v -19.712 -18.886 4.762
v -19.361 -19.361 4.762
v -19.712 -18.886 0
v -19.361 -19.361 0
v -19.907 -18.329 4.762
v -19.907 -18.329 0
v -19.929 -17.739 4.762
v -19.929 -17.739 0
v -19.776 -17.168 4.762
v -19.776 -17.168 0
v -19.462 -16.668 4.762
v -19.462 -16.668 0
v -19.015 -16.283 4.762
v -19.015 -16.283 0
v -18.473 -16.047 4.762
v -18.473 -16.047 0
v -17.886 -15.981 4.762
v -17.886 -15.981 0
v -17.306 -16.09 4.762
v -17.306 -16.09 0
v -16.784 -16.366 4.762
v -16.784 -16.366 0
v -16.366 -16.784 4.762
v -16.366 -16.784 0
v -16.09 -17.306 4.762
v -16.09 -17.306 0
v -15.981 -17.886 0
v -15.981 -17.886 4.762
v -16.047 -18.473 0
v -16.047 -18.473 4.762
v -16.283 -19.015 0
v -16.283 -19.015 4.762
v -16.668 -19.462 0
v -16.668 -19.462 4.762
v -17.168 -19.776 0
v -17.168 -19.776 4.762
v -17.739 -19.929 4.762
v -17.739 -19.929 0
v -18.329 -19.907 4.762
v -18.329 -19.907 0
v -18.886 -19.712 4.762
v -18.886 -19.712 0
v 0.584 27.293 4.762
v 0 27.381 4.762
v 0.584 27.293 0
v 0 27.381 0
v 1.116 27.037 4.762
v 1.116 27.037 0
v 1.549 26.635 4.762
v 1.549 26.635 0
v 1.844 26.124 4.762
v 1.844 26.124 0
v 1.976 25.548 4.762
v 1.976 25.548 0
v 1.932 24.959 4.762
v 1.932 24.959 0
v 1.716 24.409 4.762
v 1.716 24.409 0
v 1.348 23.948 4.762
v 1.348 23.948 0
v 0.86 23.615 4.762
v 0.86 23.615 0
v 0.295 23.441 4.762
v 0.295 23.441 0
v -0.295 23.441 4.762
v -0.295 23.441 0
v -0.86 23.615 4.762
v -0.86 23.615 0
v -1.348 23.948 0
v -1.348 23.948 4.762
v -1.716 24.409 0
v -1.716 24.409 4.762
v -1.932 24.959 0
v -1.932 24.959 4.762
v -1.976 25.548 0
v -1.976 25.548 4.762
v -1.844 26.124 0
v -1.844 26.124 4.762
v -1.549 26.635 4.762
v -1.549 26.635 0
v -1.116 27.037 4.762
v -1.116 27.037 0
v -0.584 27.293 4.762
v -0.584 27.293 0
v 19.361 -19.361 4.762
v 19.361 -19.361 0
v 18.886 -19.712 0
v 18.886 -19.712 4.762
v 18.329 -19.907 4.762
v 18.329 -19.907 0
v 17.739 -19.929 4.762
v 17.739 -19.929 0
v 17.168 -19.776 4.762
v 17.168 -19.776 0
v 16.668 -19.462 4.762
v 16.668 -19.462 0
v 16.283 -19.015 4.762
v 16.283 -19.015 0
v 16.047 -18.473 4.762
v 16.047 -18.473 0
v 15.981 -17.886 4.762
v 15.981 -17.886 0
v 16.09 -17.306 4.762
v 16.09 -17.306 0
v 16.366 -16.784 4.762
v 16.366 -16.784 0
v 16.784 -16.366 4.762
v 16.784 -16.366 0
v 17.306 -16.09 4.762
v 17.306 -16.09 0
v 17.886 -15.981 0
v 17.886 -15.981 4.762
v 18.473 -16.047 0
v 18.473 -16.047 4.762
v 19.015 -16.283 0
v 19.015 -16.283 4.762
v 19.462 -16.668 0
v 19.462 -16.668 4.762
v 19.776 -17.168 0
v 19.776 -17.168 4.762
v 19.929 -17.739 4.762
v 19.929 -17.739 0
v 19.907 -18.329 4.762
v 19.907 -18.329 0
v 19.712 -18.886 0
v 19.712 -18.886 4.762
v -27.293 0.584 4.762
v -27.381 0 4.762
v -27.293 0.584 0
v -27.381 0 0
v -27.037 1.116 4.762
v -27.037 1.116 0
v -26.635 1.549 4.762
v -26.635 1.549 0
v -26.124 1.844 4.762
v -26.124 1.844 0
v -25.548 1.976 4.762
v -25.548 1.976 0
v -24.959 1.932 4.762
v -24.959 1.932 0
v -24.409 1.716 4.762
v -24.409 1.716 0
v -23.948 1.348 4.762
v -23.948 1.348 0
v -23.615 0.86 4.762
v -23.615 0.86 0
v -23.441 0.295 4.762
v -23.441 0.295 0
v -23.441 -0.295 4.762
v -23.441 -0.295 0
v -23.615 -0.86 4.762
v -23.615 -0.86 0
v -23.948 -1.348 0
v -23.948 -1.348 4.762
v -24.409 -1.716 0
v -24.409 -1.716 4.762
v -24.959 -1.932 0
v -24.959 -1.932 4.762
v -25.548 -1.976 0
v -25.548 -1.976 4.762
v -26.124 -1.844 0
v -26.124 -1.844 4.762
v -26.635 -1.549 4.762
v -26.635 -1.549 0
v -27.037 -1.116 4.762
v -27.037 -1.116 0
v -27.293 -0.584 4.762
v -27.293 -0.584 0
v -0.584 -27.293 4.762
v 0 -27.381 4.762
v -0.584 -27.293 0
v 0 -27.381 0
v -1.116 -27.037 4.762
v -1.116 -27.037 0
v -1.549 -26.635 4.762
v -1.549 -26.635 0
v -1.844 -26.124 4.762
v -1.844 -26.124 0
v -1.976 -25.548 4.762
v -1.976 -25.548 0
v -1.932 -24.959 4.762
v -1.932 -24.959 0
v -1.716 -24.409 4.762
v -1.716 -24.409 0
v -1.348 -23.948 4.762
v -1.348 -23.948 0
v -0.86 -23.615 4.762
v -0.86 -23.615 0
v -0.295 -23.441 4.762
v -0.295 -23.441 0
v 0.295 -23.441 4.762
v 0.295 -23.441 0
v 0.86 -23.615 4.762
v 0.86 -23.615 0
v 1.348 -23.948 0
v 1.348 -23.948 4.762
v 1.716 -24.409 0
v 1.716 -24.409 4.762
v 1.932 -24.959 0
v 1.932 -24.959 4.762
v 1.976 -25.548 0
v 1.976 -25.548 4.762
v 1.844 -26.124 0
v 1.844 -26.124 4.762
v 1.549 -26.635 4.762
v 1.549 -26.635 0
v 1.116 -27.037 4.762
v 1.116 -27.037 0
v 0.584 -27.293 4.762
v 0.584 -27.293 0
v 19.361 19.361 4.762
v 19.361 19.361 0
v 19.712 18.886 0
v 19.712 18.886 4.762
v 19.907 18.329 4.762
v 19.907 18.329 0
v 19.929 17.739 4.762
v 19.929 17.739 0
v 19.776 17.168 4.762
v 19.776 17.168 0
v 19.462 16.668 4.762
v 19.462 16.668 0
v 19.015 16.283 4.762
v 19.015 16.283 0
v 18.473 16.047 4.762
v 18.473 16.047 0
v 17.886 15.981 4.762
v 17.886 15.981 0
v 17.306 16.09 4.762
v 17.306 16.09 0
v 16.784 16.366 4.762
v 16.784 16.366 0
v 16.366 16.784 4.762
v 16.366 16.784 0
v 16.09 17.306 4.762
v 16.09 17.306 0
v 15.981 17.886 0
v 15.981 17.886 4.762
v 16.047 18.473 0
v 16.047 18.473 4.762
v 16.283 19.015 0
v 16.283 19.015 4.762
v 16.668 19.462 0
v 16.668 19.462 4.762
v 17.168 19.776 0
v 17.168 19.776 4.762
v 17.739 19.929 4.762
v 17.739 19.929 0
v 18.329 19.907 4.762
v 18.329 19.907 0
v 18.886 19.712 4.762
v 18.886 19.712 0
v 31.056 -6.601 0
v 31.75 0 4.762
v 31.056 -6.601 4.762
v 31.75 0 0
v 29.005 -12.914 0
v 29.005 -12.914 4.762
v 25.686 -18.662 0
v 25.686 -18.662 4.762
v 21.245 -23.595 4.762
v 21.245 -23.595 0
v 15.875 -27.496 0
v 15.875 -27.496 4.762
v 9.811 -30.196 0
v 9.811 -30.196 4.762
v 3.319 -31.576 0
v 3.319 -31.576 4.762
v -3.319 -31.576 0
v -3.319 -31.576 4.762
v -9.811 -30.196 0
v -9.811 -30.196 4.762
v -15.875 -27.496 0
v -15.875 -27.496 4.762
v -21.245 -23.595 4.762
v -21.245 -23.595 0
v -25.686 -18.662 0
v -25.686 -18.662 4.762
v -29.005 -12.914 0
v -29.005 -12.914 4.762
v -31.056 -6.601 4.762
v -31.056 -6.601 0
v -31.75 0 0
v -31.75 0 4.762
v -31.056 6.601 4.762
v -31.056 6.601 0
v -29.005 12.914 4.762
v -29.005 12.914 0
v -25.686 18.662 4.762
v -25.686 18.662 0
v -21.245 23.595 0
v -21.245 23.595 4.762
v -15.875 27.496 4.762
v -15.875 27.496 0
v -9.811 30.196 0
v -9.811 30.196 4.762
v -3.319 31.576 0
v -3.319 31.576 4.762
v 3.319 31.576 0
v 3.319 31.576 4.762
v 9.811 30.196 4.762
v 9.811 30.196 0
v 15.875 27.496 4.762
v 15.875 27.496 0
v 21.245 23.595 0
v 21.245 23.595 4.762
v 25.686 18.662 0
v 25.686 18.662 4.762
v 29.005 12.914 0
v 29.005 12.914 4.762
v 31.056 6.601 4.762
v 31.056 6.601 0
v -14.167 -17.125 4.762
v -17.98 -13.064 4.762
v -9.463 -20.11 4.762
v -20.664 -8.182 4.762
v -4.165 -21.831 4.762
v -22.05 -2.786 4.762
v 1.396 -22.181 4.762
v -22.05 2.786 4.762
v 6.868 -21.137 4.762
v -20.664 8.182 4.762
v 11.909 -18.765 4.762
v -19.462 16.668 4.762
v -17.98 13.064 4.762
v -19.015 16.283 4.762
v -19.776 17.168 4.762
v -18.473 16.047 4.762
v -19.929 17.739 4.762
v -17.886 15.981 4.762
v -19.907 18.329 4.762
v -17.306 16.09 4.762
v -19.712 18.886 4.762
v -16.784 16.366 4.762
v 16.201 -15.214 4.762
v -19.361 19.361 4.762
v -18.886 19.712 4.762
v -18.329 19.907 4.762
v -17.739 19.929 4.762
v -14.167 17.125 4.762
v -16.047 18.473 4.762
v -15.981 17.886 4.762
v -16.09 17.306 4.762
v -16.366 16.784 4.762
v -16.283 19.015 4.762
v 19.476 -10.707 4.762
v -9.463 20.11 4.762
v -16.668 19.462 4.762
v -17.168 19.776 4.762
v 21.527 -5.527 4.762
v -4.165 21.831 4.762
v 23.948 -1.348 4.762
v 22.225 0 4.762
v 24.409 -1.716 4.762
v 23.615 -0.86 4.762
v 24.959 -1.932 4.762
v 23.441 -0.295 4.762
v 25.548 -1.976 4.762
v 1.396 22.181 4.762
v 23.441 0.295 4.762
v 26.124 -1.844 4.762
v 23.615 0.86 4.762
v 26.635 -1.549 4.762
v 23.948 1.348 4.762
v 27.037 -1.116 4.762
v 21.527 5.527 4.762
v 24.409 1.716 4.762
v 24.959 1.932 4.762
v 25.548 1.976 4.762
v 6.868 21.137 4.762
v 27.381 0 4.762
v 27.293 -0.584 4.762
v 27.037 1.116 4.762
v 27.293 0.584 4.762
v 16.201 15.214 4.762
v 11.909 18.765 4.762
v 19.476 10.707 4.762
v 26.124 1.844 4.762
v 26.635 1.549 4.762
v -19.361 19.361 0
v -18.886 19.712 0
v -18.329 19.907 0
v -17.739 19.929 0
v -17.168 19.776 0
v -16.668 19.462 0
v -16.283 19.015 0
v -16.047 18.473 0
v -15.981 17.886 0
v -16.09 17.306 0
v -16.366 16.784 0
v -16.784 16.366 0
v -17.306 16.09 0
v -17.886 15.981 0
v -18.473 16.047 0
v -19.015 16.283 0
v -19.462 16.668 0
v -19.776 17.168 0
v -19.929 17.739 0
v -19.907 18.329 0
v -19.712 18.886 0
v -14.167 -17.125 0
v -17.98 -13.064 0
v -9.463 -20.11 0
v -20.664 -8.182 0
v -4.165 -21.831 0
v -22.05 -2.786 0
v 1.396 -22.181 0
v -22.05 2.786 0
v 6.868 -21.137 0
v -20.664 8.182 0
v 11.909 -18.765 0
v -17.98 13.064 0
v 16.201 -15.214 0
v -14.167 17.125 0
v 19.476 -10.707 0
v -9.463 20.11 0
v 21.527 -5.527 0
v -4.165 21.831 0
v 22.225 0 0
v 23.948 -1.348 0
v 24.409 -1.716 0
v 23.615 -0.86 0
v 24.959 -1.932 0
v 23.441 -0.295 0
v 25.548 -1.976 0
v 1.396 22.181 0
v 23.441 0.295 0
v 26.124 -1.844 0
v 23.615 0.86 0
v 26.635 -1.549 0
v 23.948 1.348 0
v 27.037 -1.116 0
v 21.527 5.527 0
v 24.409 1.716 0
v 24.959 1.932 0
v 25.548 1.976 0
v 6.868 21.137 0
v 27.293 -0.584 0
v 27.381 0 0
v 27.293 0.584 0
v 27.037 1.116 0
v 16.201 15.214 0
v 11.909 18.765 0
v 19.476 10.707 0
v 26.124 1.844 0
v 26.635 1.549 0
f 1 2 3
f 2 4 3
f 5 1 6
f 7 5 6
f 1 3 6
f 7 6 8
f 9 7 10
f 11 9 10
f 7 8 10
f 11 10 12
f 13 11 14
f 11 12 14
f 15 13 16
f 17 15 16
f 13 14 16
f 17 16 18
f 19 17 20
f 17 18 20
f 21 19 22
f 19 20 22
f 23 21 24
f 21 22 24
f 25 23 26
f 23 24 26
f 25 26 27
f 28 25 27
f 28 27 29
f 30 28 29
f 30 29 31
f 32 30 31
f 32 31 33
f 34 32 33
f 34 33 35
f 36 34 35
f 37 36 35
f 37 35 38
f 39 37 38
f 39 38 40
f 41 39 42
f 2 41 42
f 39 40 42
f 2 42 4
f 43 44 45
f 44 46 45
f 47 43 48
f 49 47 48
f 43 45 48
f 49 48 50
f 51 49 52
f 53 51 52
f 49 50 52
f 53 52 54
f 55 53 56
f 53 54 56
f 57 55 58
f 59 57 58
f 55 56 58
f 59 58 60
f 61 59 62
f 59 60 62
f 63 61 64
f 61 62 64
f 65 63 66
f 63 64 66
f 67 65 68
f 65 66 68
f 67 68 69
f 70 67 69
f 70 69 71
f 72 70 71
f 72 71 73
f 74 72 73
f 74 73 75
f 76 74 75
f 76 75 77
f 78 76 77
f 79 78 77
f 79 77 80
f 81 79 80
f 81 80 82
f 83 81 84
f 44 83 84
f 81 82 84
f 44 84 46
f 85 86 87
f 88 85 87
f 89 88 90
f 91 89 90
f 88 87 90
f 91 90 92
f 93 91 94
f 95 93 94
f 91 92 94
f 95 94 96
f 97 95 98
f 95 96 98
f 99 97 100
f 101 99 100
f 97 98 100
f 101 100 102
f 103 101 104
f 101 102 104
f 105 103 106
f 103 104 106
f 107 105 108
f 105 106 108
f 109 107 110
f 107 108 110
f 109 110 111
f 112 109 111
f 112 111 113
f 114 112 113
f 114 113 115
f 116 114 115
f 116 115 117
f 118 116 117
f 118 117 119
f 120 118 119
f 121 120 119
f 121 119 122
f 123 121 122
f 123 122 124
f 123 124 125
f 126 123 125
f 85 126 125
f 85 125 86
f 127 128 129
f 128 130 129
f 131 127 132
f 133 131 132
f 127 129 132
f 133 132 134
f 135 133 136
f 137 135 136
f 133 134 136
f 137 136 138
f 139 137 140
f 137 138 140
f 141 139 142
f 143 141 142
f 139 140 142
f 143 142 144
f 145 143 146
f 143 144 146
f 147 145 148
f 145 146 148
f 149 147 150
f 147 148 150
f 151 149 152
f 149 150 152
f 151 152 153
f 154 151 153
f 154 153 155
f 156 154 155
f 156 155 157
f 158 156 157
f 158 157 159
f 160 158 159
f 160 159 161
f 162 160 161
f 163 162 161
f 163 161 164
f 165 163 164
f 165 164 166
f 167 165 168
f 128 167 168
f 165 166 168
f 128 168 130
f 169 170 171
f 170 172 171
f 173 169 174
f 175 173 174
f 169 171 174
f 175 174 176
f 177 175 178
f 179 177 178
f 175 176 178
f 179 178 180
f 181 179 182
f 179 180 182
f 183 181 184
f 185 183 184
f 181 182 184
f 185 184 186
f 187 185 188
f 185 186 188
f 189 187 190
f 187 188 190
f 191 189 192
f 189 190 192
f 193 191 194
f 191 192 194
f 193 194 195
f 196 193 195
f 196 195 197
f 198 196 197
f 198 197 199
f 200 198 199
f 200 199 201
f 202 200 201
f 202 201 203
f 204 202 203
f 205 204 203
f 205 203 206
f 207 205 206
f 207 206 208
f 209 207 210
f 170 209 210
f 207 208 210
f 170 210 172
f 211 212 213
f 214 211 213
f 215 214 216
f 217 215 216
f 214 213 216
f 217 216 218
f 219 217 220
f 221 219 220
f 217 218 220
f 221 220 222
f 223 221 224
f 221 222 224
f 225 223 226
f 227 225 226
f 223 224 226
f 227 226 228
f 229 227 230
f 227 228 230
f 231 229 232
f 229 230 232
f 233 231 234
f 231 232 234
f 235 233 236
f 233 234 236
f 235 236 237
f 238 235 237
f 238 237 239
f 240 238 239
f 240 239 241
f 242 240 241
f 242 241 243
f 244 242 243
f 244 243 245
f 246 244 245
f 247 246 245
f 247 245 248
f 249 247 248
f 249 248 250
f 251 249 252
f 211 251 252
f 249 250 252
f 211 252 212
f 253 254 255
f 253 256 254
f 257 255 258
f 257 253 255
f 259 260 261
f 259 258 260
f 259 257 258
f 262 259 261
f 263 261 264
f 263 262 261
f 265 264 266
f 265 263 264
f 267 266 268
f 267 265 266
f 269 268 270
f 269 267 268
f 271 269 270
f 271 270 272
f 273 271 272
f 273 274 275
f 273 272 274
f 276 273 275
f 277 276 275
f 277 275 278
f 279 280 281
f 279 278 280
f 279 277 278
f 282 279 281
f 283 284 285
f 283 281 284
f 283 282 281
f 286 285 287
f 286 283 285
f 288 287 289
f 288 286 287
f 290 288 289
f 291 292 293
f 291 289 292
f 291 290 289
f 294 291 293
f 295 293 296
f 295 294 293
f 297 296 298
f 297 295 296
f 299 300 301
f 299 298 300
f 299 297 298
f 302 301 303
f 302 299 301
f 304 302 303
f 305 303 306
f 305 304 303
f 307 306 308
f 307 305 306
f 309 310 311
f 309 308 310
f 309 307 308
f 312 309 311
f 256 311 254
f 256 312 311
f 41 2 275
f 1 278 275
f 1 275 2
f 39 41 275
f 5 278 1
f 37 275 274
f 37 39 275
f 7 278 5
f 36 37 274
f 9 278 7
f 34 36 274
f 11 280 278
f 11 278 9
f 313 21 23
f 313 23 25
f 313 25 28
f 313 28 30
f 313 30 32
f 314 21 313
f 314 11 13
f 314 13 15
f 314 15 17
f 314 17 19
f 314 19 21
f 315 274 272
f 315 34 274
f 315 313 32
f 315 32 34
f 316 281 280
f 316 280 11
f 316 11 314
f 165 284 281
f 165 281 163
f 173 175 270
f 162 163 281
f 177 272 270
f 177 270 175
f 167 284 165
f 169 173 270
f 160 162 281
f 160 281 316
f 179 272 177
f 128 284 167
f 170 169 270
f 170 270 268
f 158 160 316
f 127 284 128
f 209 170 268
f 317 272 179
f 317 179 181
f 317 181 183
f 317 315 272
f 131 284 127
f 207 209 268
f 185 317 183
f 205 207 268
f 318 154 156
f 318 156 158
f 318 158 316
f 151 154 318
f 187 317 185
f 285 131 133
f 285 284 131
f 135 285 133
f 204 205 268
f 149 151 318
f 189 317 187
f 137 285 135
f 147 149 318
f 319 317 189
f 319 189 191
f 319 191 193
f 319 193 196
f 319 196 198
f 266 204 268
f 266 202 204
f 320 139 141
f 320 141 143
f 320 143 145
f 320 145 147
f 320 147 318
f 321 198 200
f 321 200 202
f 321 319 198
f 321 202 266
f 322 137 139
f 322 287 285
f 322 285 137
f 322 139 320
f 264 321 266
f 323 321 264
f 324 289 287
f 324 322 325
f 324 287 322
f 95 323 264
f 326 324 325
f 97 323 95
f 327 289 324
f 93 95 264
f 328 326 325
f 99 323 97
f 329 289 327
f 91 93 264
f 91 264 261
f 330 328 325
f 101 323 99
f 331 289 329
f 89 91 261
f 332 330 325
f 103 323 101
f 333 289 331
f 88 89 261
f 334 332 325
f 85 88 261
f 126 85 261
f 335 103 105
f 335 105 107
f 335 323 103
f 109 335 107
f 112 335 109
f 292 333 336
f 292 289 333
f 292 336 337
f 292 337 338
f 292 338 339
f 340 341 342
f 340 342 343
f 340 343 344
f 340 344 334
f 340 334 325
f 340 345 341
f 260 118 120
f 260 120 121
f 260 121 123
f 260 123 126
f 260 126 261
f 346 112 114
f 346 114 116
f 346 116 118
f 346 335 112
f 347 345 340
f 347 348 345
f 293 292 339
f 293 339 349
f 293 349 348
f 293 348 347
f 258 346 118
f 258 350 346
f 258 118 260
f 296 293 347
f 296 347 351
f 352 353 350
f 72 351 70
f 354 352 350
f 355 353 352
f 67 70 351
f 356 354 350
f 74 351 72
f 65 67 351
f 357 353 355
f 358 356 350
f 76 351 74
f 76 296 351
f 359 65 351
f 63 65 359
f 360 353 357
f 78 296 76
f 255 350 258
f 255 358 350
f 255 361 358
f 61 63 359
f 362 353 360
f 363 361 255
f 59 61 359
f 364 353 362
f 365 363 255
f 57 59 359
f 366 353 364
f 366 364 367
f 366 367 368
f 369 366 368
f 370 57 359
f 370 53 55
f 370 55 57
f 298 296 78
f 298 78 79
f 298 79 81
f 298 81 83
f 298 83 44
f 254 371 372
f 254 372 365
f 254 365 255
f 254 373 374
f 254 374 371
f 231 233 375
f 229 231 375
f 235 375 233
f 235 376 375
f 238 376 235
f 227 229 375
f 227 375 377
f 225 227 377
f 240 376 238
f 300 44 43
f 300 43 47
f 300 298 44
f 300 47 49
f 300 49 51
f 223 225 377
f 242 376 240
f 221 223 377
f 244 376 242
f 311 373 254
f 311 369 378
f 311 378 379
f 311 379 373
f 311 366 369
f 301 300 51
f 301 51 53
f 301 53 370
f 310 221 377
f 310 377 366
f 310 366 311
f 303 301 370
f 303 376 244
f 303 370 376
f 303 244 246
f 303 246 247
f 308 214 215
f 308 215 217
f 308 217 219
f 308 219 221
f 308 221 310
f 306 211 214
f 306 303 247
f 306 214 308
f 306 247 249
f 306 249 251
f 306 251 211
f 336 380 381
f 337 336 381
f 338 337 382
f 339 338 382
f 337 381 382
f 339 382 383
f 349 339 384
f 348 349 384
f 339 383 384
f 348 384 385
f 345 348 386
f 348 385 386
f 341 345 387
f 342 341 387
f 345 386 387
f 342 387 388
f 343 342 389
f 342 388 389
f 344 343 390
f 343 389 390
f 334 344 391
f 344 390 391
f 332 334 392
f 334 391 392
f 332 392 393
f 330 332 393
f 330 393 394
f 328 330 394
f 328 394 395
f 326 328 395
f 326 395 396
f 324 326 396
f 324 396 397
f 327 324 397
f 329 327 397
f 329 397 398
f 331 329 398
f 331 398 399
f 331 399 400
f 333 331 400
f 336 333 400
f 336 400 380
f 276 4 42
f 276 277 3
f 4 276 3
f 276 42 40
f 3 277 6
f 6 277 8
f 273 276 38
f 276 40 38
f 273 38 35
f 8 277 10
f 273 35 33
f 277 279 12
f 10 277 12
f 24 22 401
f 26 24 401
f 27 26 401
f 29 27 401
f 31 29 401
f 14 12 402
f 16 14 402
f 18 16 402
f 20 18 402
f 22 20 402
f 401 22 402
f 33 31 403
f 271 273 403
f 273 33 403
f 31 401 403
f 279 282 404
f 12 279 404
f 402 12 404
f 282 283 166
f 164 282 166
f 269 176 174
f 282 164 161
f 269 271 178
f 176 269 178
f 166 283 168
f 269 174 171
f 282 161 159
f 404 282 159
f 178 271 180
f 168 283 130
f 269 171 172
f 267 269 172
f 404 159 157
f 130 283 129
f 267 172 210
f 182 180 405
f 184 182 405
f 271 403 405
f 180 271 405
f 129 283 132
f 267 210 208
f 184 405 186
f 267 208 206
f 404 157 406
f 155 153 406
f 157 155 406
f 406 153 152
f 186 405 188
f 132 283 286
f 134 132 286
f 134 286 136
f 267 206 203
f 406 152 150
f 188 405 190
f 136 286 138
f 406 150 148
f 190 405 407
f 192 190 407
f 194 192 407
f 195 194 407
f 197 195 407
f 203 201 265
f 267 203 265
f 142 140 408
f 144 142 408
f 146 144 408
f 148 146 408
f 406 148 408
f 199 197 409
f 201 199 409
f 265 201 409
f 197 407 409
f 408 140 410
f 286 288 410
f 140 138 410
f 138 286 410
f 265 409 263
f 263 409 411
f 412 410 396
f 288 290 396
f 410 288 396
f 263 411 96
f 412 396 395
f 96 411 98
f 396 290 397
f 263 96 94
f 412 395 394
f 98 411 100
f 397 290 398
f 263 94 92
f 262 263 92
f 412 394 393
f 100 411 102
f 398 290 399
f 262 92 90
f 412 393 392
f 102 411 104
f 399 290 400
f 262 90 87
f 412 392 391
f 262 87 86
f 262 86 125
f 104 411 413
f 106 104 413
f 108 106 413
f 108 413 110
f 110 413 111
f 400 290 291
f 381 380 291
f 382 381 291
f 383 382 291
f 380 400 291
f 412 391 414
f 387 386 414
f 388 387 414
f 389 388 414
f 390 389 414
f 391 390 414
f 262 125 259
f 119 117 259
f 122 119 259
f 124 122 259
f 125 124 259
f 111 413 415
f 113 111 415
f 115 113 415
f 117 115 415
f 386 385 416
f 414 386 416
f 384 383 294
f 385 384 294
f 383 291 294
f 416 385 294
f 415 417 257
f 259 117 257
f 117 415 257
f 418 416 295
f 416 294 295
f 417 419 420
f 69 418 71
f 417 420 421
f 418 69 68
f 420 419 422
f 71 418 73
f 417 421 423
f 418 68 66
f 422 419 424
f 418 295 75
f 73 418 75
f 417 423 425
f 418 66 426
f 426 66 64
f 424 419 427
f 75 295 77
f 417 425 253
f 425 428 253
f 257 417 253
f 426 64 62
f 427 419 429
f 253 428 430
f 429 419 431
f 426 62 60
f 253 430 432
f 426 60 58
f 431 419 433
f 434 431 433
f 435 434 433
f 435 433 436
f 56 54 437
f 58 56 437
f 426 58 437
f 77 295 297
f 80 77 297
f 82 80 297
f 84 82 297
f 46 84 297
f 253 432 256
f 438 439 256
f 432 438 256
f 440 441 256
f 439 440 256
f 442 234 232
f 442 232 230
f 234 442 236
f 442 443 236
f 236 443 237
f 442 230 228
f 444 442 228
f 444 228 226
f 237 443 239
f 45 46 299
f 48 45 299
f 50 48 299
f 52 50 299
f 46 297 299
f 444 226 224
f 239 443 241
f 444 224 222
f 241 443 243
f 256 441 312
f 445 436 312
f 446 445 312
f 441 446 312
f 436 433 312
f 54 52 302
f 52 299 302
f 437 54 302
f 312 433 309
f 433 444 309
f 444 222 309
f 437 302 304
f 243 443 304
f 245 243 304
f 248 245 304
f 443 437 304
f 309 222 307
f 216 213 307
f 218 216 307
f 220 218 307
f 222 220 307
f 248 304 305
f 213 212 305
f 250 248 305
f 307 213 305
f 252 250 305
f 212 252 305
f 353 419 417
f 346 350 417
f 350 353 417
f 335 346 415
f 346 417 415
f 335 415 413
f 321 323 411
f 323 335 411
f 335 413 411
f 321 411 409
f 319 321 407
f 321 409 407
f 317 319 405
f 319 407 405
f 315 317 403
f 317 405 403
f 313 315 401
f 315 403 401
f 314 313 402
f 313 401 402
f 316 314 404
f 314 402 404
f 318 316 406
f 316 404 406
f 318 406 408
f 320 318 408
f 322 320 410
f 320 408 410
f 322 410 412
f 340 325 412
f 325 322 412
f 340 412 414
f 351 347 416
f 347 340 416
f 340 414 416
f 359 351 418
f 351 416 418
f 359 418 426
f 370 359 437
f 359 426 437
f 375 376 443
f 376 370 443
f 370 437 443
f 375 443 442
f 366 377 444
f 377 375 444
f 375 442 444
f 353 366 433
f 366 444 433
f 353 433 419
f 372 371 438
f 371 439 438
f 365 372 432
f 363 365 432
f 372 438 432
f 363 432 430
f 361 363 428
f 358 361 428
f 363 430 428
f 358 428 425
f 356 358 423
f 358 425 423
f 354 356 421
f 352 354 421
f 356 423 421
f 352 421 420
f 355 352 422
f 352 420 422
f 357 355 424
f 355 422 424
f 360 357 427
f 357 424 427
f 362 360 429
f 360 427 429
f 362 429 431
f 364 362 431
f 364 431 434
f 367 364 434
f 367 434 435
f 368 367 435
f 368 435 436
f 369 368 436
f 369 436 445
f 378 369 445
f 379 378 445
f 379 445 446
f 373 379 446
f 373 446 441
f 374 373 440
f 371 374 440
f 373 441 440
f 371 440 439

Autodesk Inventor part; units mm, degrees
ref_plane "YZ Plane" through (0, 0, 0) normal (1, 0, 0) x (0, 1, 0)
ref_plane "XZ Plane" through (0, 0, 0) normal (0, 1, 0) x (-1, 0, 0)
ref_plane "XY Plane" through (0, 0, 0) normal (0, 0, 1) x (1, 0, 0)
sketch "Sketch2" plane through (0, 0, 0) normal (0, 0, 1) x (1, 0, 0)
  circle A0 centre (0, 0) radius 22.225
  circle A1 centre (0, 0) radius 31.75
  dimension "d0" = 44.45
  dimension "d1" = 9.525
extrude "Extrusion1" add sketch "Sketch2" along normal blind 4.7625
sketch "Sketch3" plane through (0, 0, 4.7625) normal (0, 0, 1) x (1, 0, 0)
  line L0 (0, 0) -> (0, -25.4) construction
  dimension "d4" = 25.4
hole "Hole1" at (0, -25.4, 4.7625) direction (0, 0, -1) diameter 3.9624 end through all thread size "10-32 UNF" class "2B" standard "ANSI Unified Screw Threads"
pattern_circular "Circular Pattern1" count 8 over 360 about axis through (0, 0, -10) along (0, 0, 1) of "Hole1"
properties part number "HUB,GEAR,ARM" material "Aluminum 7075"
